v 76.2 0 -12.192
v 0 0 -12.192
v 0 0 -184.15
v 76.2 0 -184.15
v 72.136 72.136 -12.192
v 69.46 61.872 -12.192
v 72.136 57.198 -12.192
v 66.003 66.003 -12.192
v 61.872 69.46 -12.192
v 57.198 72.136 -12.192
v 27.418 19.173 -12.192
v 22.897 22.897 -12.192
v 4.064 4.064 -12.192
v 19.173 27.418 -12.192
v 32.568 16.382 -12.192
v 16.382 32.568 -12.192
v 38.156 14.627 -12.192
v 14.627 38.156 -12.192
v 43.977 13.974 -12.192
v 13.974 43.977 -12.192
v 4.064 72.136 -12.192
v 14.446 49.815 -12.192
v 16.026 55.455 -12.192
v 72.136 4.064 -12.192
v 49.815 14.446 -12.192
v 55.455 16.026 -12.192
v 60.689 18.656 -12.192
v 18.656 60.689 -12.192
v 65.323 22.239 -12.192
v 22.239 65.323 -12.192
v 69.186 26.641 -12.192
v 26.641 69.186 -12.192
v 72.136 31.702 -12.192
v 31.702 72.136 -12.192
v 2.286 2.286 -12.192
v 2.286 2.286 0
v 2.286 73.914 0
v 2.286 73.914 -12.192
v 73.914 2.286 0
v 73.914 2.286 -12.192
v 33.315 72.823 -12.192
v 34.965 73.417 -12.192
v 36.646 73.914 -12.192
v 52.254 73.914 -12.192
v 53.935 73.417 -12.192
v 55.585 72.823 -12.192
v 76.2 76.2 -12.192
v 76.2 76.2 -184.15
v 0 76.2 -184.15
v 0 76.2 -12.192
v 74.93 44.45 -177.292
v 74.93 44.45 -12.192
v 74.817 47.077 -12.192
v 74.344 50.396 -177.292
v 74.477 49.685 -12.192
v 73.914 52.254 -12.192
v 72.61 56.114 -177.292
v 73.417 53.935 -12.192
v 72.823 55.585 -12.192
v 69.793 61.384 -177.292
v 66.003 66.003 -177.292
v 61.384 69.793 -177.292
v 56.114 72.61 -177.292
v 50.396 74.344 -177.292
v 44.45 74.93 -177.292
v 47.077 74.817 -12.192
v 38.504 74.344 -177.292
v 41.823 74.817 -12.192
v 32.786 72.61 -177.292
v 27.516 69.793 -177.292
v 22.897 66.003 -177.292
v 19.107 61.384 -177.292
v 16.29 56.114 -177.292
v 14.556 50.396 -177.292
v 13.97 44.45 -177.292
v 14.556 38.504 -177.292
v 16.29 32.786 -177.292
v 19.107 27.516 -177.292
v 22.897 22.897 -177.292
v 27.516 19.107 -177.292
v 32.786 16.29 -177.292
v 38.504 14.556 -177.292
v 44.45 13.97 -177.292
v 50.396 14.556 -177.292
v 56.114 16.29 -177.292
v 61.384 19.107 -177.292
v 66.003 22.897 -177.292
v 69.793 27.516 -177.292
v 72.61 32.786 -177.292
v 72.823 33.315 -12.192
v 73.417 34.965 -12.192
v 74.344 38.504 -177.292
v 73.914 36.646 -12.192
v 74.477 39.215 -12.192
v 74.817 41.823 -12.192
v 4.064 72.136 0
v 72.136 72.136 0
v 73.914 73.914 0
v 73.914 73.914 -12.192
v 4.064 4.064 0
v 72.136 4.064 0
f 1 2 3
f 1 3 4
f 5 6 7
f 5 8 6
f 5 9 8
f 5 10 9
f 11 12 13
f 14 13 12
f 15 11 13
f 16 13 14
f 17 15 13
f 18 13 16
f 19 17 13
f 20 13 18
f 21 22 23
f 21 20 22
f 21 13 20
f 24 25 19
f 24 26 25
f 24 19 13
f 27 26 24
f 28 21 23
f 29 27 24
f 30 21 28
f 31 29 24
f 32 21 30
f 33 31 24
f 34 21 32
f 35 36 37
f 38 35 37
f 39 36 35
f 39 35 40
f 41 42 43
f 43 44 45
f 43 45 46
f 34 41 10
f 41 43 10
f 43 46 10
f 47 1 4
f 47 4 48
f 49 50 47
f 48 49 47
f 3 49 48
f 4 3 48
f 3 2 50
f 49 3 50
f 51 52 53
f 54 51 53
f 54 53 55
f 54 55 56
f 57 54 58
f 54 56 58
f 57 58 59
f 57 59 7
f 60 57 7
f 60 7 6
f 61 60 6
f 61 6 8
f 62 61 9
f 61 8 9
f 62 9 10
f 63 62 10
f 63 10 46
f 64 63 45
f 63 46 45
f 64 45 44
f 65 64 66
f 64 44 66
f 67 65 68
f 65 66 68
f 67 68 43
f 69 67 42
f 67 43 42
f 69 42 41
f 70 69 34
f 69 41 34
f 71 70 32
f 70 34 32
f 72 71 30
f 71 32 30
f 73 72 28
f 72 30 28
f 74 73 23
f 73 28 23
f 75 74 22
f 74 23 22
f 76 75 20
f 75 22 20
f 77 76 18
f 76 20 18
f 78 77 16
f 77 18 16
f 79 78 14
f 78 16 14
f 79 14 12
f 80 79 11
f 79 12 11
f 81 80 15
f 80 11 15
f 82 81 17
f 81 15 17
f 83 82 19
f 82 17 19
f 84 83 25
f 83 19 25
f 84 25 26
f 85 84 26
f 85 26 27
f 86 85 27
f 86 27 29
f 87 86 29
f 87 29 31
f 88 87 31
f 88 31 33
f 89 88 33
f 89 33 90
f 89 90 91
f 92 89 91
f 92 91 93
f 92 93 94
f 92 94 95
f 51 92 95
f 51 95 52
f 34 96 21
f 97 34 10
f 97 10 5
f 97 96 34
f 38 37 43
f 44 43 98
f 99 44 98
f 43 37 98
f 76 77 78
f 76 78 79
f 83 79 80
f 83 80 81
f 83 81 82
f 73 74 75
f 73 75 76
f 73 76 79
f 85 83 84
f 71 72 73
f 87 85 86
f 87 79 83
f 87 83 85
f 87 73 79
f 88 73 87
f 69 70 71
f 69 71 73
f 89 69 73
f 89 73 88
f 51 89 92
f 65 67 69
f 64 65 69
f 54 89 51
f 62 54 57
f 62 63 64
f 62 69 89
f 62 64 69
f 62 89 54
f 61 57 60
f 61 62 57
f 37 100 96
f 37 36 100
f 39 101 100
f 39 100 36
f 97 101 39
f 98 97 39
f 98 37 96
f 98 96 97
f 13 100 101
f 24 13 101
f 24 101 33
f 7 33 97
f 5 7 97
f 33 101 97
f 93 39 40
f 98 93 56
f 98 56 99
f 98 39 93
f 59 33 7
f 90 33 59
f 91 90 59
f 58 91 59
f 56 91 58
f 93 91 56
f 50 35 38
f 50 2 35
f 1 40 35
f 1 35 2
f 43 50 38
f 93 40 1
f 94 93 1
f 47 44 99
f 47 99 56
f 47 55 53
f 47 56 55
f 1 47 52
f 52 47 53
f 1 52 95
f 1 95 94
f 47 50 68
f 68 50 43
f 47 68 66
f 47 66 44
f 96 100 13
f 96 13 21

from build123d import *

# Parameters (mm, degrees)
SKETCH1_W           = 76.2
SKETCH1_H           = 76.2
BOSS_EXTRUDE1_DEPTH = 184.15
SKETCH3_W           = 76.2
SKETCH3_H           = 76.2
SKETCH3_W_2         = 71.628
SKETCH3_H_2         = 71.628
SKETCH3_W_3         = 68.072
SKETCH3_H_3         = 68.072
CUT_EXTRUDE2_DEPTH  = 12.192
SKETCH4_R           = 30.48
CUT_EXTRUDE4_DEPTH  = 165.1


with BuildPart() as part:
    # Sketch1 → Boss-Extrude1 (new body)
    with BuildSketch(Plane.XY):
        with Locations((38.1, 38.1)):
            Rectangle(SKETCH1_W, SKETCH1_H)
    extrude(amount=-BOSS_EXTRUDE1_DEPTH)

    # Sketch3 → Cut-Extrude2 (cut)
    # profile 1 of 2: a face of its own
    with BuildSketch(Plane.XY):
        with Locations((38.1, 38.1)):
            Rectangle(SKETCH3_W, SKETCH3_H)
        with Locations((38.1, 38.1)):
            Rectangle(SKETCH3_W_2, SKETCH3_H_2, mode=Mode.SUBTRACT)
    # profile 2 of 2: a face of its own
    with BuildSketch(Plane.XY):
        with Locations((38.1, 38.1)):
            Rectangle(SKETCH3_W_3, SKETCH3_H_3)
    extrude(amount=-CUT_EXTRUDE2_DEPTH, mode=Mode.SUBTRACT)

    # Sketch4 → Cut-Extrude4 (cut)
    with BuildSketch(Plane.XY.offset(-12.192)):
        with Locations((44.45, 44.45)):
            Circle(SKETCH4_R)
    extrude(amount=-CUT_EXTRUDE4_DEPTH, mode=Mode.SUBTRACT)


solid = part.part
